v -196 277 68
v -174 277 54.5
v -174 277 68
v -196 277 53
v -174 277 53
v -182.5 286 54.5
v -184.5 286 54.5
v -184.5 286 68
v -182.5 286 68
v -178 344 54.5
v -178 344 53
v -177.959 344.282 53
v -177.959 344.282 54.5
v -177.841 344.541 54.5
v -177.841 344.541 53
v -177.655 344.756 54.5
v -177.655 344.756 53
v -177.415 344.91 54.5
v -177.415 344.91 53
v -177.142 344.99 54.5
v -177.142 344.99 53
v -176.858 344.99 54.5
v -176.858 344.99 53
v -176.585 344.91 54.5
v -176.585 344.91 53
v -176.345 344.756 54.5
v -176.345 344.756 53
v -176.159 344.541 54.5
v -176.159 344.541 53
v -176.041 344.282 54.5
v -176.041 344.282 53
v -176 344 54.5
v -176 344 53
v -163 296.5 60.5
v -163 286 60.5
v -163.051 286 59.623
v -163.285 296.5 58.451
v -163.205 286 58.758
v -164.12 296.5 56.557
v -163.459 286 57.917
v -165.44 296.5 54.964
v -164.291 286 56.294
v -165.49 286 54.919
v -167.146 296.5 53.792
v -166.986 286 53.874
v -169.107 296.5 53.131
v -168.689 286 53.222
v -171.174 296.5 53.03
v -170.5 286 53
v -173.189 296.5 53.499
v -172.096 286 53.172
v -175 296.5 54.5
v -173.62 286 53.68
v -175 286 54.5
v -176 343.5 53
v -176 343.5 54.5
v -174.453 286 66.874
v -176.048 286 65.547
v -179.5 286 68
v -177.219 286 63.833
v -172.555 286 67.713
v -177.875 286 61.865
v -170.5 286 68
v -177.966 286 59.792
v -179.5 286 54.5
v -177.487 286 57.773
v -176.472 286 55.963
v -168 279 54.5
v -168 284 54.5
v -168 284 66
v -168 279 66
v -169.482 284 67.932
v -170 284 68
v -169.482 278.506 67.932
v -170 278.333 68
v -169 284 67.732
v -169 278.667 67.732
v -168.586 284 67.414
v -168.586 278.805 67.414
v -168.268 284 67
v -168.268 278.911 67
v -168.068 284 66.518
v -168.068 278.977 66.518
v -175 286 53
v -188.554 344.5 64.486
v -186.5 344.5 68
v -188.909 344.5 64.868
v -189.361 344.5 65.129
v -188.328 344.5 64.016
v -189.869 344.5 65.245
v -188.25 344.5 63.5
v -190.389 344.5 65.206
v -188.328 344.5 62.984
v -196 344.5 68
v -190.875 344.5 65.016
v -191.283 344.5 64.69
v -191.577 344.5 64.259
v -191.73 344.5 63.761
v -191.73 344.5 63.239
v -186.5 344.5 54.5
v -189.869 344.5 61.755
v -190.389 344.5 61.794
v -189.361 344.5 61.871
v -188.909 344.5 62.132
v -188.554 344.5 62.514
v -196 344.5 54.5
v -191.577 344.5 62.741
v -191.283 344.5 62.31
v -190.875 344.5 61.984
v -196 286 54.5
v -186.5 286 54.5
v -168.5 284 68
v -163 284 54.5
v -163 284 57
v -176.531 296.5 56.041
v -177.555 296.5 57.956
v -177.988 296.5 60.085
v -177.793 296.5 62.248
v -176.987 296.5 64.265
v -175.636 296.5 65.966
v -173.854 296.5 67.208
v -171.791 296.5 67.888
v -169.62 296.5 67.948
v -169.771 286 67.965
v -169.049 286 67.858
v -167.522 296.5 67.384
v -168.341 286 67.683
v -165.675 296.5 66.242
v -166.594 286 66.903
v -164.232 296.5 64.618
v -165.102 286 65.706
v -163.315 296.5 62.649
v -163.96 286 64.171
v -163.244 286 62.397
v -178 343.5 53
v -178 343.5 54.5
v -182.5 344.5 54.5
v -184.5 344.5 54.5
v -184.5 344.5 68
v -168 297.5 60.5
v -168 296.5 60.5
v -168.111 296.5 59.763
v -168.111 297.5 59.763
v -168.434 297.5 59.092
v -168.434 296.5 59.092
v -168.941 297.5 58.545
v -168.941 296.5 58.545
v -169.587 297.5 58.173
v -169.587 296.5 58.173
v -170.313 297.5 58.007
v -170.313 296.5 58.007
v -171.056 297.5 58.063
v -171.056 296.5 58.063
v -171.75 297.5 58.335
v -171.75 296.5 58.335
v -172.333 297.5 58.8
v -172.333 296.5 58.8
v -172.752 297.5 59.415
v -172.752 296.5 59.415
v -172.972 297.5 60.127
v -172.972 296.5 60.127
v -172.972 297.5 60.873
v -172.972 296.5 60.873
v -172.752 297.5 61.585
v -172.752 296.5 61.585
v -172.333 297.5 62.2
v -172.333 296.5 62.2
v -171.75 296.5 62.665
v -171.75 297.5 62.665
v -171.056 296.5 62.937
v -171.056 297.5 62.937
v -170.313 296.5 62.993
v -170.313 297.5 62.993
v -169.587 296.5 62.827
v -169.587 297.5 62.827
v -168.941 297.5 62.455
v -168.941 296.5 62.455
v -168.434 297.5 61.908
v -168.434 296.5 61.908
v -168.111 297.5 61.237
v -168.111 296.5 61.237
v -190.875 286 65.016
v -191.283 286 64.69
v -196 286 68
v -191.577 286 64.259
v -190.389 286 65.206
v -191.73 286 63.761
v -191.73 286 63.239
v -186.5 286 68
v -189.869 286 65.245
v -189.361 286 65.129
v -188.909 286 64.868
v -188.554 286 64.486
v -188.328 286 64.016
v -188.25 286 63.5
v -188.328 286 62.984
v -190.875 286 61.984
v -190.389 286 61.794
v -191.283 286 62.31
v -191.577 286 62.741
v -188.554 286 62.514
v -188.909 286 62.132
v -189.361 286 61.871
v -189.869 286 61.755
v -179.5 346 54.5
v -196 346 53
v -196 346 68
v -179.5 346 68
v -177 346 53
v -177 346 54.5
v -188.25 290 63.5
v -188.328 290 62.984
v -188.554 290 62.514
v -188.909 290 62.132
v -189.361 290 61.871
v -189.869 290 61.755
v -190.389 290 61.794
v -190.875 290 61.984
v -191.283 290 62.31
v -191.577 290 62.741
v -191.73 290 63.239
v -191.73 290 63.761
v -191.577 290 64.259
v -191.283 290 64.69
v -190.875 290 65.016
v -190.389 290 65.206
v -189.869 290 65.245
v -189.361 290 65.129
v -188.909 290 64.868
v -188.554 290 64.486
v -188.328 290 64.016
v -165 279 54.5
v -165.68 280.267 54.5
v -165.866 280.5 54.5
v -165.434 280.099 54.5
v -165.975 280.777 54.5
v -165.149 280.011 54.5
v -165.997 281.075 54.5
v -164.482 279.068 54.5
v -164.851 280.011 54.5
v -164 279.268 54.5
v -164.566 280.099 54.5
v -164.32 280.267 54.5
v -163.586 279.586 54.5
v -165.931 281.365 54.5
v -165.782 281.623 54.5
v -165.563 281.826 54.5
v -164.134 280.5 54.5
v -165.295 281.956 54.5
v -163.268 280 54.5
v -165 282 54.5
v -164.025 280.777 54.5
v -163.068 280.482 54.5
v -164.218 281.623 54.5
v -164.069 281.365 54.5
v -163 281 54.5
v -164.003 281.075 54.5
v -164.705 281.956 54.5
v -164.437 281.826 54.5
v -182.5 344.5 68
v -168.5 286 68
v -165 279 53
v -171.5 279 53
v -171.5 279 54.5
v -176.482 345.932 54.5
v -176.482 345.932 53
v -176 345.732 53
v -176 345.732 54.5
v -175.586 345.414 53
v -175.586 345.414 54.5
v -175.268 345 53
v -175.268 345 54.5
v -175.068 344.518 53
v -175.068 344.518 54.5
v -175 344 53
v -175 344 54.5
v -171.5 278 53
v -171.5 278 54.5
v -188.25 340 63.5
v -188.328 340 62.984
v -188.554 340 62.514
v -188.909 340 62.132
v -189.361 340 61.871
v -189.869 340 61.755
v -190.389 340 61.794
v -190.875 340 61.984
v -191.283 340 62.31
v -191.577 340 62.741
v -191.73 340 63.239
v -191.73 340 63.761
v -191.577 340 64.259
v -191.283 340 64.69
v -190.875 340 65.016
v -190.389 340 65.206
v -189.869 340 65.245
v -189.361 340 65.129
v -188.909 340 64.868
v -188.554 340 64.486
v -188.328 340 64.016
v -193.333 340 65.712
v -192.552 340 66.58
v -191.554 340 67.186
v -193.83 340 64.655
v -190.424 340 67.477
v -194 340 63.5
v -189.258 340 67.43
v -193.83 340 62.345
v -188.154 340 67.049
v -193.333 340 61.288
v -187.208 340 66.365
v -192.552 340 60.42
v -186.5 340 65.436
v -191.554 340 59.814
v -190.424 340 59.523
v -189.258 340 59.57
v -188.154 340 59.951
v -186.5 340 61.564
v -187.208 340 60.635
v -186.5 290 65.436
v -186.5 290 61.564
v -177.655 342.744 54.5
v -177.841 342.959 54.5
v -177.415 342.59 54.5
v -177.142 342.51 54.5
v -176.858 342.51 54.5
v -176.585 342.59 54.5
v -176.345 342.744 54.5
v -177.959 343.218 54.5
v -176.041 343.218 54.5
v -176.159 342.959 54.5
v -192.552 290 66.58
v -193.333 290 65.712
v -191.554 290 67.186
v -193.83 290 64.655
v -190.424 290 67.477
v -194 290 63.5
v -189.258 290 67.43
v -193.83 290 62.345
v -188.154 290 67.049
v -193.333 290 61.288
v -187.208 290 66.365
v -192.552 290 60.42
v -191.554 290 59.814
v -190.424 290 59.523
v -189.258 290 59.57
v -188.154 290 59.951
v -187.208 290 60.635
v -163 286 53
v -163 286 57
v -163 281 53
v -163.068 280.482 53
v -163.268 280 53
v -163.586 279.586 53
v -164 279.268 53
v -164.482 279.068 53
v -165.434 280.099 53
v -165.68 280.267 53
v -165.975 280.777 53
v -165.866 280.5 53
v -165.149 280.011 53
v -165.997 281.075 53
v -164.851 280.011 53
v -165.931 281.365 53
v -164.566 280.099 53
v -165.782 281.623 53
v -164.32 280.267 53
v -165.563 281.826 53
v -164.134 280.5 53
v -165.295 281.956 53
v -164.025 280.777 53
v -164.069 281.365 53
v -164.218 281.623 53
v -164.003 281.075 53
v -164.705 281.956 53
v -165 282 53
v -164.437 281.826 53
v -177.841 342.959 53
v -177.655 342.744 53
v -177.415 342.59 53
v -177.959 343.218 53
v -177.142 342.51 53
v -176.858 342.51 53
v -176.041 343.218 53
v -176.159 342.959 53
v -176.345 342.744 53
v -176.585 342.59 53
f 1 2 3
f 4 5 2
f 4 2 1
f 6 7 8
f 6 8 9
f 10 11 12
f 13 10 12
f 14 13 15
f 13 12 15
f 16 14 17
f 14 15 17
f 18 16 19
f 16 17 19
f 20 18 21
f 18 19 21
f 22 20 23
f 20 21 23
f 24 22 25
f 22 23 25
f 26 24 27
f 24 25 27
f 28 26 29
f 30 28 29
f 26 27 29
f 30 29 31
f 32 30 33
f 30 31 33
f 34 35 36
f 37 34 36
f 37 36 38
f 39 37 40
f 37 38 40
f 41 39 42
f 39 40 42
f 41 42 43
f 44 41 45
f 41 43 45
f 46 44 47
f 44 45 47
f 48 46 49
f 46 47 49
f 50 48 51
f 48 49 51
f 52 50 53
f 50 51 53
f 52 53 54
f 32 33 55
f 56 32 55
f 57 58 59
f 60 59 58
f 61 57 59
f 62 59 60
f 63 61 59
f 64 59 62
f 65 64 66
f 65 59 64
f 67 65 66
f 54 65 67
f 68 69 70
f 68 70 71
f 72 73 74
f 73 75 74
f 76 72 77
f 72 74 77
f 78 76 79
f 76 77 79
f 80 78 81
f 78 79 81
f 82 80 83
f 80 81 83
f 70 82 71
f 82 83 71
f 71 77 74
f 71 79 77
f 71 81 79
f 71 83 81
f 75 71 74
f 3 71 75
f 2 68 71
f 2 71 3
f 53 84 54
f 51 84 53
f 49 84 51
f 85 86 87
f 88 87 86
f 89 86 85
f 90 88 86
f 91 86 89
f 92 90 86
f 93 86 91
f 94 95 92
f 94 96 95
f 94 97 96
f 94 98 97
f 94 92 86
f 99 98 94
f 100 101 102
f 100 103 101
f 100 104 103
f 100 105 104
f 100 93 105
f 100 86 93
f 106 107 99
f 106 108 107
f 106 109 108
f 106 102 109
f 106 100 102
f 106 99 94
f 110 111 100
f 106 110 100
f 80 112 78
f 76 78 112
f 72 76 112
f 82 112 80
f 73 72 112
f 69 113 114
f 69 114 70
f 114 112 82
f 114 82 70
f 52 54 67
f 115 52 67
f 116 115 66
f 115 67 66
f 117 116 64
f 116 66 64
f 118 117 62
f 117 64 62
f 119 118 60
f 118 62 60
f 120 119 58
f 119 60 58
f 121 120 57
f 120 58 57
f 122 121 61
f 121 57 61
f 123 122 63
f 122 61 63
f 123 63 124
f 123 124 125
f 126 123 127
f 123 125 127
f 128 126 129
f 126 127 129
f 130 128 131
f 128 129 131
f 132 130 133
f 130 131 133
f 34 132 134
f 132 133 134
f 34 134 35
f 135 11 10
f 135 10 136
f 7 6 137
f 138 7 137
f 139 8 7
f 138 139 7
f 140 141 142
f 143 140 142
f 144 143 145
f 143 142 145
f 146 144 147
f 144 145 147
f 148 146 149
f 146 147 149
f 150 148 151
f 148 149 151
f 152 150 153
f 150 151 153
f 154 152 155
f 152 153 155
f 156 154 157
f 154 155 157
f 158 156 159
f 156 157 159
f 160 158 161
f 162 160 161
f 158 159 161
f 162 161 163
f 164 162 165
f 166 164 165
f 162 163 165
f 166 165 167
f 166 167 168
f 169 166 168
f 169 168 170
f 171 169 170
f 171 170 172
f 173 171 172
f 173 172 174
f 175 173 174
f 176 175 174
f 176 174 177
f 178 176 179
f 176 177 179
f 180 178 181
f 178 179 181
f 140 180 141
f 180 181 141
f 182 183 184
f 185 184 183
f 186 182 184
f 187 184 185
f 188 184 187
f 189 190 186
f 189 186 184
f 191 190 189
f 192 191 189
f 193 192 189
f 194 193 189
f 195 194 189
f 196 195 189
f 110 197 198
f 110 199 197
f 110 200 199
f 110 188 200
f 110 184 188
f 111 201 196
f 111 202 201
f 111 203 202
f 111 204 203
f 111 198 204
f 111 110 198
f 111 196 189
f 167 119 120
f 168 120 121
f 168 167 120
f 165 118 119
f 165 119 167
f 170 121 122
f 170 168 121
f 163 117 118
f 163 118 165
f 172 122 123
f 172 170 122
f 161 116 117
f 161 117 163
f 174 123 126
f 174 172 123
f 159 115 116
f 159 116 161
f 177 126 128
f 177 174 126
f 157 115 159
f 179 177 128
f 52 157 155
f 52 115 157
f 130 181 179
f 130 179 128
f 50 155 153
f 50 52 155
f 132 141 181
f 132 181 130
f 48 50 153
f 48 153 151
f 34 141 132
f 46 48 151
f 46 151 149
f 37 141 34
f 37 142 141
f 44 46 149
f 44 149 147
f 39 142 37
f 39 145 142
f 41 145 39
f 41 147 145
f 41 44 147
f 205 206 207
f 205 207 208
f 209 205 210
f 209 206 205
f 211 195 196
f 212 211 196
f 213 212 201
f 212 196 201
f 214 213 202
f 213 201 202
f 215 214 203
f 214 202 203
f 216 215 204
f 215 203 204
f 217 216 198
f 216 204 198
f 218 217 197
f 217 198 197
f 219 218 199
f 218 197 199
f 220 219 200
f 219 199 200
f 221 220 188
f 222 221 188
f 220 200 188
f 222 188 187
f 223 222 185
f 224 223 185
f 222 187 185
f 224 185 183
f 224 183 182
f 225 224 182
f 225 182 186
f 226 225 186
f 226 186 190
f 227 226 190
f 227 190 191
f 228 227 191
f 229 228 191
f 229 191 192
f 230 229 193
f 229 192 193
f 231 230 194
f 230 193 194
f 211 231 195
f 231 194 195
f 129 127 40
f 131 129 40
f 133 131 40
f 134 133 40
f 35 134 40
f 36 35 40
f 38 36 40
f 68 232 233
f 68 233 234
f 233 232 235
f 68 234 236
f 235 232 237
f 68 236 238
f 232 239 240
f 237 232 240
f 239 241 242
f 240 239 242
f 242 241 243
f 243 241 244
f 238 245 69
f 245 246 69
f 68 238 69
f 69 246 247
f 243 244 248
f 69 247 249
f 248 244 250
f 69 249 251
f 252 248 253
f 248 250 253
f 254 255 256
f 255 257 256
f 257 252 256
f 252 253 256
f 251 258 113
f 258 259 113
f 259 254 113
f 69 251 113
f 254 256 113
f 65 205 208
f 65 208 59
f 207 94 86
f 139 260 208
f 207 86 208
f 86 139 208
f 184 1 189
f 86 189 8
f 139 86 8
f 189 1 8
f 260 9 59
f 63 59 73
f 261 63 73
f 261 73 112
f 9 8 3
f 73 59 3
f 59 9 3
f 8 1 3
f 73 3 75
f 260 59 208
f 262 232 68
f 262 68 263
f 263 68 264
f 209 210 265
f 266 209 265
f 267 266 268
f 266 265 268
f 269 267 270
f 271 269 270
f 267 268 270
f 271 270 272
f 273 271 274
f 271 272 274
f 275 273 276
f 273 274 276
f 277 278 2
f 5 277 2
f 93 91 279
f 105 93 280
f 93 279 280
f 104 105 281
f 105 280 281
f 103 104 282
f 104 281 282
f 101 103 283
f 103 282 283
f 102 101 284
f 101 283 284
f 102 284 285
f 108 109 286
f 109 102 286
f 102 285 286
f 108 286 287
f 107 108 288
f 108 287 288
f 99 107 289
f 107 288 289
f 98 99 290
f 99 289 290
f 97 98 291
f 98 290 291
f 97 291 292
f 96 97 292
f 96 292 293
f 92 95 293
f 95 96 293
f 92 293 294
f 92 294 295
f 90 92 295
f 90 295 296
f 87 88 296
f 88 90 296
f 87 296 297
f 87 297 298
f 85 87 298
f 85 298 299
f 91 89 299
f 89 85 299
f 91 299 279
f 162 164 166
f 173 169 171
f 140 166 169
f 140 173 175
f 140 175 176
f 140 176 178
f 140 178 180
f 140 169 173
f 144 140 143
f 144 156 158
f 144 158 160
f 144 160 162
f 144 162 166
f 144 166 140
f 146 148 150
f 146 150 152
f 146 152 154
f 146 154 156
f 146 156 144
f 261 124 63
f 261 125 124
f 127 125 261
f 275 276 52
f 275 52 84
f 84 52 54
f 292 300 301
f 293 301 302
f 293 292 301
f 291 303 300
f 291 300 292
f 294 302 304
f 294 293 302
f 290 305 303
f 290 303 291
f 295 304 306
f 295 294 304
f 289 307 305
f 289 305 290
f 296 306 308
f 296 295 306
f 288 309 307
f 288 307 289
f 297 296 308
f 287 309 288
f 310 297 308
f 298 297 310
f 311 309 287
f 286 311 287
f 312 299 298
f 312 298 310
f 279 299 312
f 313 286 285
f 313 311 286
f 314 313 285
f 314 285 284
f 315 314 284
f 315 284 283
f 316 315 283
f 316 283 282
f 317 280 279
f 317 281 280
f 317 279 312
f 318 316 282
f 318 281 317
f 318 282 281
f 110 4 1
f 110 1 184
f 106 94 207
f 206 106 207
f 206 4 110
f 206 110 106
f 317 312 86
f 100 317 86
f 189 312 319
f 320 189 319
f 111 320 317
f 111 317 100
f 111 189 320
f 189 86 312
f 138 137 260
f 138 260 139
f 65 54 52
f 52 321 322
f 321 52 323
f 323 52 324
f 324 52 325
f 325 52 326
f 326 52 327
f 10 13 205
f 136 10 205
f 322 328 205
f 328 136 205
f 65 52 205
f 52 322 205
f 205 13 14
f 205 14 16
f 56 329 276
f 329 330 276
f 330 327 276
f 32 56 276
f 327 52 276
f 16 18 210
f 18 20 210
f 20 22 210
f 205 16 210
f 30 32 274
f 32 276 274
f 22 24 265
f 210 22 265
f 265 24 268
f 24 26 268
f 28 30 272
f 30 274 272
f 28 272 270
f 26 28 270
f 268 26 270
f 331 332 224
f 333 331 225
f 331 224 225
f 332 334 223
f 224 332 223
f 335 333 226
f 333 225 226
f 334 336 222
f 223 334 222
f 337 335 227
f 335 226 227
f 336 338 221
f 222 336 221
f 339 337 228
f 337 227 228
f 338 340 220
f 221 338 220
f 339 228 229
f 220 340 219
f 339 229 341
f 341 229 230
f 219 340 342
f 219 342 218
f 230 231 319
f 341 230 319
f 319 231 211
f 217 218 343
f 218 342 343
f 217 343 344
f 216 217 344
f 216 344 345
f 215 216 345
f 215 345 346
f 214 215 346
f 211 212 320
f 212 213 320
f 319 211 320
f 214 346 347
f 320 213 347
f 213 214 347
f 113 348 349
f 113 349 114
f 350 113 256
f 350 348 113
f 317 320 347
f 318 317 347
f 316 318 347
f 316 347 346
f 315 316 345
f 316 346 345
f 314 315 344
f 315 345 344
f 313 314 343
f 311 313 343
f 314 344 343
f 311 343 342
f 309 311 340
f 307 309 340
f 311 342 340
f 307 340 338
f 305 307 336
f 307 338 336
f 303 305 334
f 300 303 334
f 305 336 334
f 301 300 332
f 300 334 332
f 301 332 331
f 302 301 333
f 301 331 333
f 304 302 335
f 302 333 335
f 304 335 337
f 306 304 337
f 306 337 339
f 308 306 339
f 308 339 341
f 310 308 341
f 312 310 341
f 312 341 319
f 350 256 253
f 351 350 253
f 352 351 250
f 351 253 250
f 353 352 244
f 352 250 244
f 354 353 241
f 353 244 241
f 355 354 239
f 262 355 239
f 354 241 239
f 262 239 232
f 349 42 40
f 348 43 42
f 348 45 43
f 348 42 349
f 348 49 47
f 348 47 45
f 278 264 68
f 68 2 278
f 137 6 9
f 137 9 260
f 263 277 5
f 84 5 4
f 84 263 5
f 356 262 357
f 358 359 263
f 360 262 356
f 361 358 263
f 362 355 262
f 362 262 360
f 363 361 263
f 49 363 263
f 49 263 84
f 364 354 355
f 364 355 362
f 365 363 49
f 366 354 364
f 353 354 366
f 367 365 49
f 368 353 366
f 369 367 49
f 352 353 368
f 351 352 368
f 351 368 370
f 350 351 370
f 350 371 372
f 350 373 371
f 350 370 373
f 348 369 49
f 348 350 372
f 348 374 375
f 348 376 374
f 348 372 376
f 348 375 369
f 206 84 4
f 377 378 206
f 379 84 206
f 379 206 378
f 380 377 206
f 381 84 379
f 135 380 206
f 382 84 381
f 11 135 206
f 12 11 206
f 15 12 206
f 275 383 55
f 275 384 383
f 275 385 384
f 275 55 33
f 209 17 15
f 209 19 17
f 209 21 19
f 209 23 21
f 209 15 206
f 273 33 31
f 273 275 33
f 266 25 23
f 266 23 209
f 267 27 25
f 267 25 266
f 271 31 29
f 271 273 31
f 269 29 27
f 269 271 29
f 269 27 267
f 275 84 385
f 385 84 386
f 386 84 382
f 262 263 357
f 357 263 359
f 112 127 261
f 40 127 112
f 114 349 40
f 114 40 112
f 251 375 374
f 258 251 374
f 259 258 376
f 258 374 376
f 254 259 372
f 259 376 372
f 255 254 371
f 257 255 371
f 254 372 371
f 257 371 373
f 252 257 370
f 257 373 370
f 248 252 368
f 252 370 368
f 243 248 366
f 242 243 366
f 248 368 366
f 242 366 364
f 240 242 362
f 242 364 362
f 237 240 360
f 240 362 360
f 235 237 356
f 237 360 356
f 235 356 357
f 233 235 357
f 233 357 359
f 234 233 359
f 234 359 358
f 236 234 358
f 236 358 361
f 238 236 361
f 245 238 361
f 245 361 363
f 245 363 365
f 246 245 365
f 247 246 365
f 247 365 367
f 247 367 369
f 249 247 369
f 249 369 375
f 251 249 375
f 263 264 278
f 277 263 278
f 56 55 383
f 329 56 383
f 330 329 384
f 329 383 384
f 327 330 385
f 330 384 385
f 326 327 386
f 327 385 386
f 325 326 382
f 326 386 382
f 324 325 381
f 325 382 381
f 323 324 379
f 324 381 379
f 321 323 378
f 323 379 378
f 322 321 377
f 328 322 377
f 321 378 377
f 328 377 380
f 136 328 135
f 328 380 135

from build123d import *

# Parameters (mm, degrees)
PAD026_DEPTH            = 1.5
SKETCH032_R             = 1
POCKET005_DEPTH         = 1.501
PAD027_DEPTH            = 13.5
FILLET001_R             = 2
CHAMFER004_SIZE2        = 11
CHAMFER004_SIZE         = 5.5
SKETCH034_R             = 7.5
PAD028_DEPTH            = 10.5
SKETCH035_R             = 2.5
PAD029_DEPTH            = 1
SKETCH036_W             = 2
SKETCH036_H             = 13.5
PAD030_DEPTH            = 60
SKETCH037_R             = 1.75
PAD031_DEPTH            = 4
SKETCH038_R             = 4
PAD032_DEPTH            = 50
SKETCH039_R             = 1.75
PAD033_DEPTH            = 6
BODY011_ROLL_ANGLE      = 180
BODY011_PLACEMENT_ANGLE = 90


with BuildPart() as part:
    # Sketch031 → Pad026 (new body)
    with BuildSketch(Plane.XY):
        with BuildLine():
            Line((0, 0), (69, 0))
            Line((69, 0), (69, 19))
            ThreePointArc((69, 19), (68.414214, 20.414214), (67, 21))
            Line((67, 21), (9, 21))
            Line((9, 21), (9, 33))
            Line((9, 33), (4, 33))
            ThreePointArc((4, 33), (2.585786, 32.414214), (2, 31))
            Line((2, 31), (2, 24.5))
            Line((2, 24.5), (1, 24.5))
            Line((1, 24.5), (0, 22))
            Line((0, 0), (0, 22))
        make_face()
    extrude(amount=PAD026_DEPTH)

    # Sketch032 (on Face13 of Pad026) → Pocket005 (cut, through all)
    with BuildSketch(Plane.XY.offset(1.5)):
        with Locations((4, 31)):
            Circle(SKETCH032_R)
        with BuildLine():
            ThreePointArc((67, 18), (68, 19), (67, 20))
            Line((67, 20), (66.5, 20))
            ThreePointArc((66.5, 20), (65.5, 19), (66.5, 18))
            Line((67, 18), (66.5, 18))
        make_face()
    extrude(amount=-POCKET005_DEPTH, mode=Mode.SUBTRACT)

    # Sketch033 (on Face4 of Pocket005) → Pad027 (join)
    with BuildSketch(Plane(origin=(0, 0, 0), x_dir=(1, 0, 0), z_dir=(0, 0, -1))):
        Polygon((69, -16.5), (9, -16.5), (9, -33), (7, -33), (7, -28), (2, -28), (0, -22), (0, 0), (9, 0), (9, -13.5), (67.5, -13.5), (67.5, 0), (69, 0), align=None)
    extrude(amount=PAD027_DEPTH)

    # Fillet001
    fillet001_edges = [part.edges().sort_by_distance(p)[0] for p in [
        (4.5, 28, -13.5),
    ]]
    fillet(fillet001_edges, radius=FILLET001_R)

    # Chamfer004
    chamfer004_edges = [part.edges().sort_by_distance(p)[0] for p in [
        (8, 33, -13.5),
    ]]
    chamfer004_side = part.faces().sort_by_distance((21.468212, 13.972492, -13.5))[0]
    chamfer(chamfer004_edges, length=CHAMFER004_SIZE, length2=CHAMFER004_SIZE2, reference=chamfer004_side)

    # Sketch034 (on Face5 of Chamfer004) → Pad028 (join)
    with BuildSketch(Plane.YZ.offset(9)):
        with Locations((25.5, -6)):
            Circle(SKETCH034_R)
    extrude(amount=PAD028_DEPTH)

    # Sketch035 (on Face1 of Pad028) → Pad029 (join)
    with BuildSketch(Plane.YZ.offset(19.5)):
        with Locations((25.5, -6)):
            Circle(SKETCH035_R)
    extrude(amount=PAD029_DEPTH)

    # Sketch036 (on Face23 of Pad029) → Pad030 (join)
    with BuildSketch(Plane.YZ.offset(9)):
        with Locations((10.5, -6.75)):
            Rectangle(SKETCH036_W, SKETCH036_H)
    extrude(amount=PAD030_DEPTH)

    # Sketch037 (on Face1 of Pad030) → Pad031 (join)
    with BuildSketch(Plane.YZ.offset(9)):
        with Locations((6, -9)):
            Circle(SKETCH037_R)
    extrude(amount=PAD031_DEPTH)

    # Sketch038 (on Face22 of Pad031) → Pad032 (join)
    with BuildSketch(Plane.YZ.offset(13)):
        with Locations((6, -9)):
            Circle(SKETCH038_R)
    extrude(amount=PAD032_DEPTH)

    # Sketch039 (on Face8 of Pad032) → Pad033 (join)
    with BuildSketch(Plane.YZ.offset(63)):
        with Locations((6, -9)):
            Circle(SKETCH039_R)
    extrude(amount=PAD033_DEPTH)


with BuildPart() as part_1:
    # Body011 roll: moved
    add(part.part.rotate(Axis((0, 0, 0), (1, 0, 0)), BODY011_ROLL_ANGLE))


with BuildPart() as part_2:
    # Body011 placement: moved
    add(part_1.part.moved(Location((-196, 277, 54.5))).rotate(Axis((-196, 277, 54.5), (0, 0, 1)), BODY011_PLACEMENT_ANGLE))


solid = part_2.part
